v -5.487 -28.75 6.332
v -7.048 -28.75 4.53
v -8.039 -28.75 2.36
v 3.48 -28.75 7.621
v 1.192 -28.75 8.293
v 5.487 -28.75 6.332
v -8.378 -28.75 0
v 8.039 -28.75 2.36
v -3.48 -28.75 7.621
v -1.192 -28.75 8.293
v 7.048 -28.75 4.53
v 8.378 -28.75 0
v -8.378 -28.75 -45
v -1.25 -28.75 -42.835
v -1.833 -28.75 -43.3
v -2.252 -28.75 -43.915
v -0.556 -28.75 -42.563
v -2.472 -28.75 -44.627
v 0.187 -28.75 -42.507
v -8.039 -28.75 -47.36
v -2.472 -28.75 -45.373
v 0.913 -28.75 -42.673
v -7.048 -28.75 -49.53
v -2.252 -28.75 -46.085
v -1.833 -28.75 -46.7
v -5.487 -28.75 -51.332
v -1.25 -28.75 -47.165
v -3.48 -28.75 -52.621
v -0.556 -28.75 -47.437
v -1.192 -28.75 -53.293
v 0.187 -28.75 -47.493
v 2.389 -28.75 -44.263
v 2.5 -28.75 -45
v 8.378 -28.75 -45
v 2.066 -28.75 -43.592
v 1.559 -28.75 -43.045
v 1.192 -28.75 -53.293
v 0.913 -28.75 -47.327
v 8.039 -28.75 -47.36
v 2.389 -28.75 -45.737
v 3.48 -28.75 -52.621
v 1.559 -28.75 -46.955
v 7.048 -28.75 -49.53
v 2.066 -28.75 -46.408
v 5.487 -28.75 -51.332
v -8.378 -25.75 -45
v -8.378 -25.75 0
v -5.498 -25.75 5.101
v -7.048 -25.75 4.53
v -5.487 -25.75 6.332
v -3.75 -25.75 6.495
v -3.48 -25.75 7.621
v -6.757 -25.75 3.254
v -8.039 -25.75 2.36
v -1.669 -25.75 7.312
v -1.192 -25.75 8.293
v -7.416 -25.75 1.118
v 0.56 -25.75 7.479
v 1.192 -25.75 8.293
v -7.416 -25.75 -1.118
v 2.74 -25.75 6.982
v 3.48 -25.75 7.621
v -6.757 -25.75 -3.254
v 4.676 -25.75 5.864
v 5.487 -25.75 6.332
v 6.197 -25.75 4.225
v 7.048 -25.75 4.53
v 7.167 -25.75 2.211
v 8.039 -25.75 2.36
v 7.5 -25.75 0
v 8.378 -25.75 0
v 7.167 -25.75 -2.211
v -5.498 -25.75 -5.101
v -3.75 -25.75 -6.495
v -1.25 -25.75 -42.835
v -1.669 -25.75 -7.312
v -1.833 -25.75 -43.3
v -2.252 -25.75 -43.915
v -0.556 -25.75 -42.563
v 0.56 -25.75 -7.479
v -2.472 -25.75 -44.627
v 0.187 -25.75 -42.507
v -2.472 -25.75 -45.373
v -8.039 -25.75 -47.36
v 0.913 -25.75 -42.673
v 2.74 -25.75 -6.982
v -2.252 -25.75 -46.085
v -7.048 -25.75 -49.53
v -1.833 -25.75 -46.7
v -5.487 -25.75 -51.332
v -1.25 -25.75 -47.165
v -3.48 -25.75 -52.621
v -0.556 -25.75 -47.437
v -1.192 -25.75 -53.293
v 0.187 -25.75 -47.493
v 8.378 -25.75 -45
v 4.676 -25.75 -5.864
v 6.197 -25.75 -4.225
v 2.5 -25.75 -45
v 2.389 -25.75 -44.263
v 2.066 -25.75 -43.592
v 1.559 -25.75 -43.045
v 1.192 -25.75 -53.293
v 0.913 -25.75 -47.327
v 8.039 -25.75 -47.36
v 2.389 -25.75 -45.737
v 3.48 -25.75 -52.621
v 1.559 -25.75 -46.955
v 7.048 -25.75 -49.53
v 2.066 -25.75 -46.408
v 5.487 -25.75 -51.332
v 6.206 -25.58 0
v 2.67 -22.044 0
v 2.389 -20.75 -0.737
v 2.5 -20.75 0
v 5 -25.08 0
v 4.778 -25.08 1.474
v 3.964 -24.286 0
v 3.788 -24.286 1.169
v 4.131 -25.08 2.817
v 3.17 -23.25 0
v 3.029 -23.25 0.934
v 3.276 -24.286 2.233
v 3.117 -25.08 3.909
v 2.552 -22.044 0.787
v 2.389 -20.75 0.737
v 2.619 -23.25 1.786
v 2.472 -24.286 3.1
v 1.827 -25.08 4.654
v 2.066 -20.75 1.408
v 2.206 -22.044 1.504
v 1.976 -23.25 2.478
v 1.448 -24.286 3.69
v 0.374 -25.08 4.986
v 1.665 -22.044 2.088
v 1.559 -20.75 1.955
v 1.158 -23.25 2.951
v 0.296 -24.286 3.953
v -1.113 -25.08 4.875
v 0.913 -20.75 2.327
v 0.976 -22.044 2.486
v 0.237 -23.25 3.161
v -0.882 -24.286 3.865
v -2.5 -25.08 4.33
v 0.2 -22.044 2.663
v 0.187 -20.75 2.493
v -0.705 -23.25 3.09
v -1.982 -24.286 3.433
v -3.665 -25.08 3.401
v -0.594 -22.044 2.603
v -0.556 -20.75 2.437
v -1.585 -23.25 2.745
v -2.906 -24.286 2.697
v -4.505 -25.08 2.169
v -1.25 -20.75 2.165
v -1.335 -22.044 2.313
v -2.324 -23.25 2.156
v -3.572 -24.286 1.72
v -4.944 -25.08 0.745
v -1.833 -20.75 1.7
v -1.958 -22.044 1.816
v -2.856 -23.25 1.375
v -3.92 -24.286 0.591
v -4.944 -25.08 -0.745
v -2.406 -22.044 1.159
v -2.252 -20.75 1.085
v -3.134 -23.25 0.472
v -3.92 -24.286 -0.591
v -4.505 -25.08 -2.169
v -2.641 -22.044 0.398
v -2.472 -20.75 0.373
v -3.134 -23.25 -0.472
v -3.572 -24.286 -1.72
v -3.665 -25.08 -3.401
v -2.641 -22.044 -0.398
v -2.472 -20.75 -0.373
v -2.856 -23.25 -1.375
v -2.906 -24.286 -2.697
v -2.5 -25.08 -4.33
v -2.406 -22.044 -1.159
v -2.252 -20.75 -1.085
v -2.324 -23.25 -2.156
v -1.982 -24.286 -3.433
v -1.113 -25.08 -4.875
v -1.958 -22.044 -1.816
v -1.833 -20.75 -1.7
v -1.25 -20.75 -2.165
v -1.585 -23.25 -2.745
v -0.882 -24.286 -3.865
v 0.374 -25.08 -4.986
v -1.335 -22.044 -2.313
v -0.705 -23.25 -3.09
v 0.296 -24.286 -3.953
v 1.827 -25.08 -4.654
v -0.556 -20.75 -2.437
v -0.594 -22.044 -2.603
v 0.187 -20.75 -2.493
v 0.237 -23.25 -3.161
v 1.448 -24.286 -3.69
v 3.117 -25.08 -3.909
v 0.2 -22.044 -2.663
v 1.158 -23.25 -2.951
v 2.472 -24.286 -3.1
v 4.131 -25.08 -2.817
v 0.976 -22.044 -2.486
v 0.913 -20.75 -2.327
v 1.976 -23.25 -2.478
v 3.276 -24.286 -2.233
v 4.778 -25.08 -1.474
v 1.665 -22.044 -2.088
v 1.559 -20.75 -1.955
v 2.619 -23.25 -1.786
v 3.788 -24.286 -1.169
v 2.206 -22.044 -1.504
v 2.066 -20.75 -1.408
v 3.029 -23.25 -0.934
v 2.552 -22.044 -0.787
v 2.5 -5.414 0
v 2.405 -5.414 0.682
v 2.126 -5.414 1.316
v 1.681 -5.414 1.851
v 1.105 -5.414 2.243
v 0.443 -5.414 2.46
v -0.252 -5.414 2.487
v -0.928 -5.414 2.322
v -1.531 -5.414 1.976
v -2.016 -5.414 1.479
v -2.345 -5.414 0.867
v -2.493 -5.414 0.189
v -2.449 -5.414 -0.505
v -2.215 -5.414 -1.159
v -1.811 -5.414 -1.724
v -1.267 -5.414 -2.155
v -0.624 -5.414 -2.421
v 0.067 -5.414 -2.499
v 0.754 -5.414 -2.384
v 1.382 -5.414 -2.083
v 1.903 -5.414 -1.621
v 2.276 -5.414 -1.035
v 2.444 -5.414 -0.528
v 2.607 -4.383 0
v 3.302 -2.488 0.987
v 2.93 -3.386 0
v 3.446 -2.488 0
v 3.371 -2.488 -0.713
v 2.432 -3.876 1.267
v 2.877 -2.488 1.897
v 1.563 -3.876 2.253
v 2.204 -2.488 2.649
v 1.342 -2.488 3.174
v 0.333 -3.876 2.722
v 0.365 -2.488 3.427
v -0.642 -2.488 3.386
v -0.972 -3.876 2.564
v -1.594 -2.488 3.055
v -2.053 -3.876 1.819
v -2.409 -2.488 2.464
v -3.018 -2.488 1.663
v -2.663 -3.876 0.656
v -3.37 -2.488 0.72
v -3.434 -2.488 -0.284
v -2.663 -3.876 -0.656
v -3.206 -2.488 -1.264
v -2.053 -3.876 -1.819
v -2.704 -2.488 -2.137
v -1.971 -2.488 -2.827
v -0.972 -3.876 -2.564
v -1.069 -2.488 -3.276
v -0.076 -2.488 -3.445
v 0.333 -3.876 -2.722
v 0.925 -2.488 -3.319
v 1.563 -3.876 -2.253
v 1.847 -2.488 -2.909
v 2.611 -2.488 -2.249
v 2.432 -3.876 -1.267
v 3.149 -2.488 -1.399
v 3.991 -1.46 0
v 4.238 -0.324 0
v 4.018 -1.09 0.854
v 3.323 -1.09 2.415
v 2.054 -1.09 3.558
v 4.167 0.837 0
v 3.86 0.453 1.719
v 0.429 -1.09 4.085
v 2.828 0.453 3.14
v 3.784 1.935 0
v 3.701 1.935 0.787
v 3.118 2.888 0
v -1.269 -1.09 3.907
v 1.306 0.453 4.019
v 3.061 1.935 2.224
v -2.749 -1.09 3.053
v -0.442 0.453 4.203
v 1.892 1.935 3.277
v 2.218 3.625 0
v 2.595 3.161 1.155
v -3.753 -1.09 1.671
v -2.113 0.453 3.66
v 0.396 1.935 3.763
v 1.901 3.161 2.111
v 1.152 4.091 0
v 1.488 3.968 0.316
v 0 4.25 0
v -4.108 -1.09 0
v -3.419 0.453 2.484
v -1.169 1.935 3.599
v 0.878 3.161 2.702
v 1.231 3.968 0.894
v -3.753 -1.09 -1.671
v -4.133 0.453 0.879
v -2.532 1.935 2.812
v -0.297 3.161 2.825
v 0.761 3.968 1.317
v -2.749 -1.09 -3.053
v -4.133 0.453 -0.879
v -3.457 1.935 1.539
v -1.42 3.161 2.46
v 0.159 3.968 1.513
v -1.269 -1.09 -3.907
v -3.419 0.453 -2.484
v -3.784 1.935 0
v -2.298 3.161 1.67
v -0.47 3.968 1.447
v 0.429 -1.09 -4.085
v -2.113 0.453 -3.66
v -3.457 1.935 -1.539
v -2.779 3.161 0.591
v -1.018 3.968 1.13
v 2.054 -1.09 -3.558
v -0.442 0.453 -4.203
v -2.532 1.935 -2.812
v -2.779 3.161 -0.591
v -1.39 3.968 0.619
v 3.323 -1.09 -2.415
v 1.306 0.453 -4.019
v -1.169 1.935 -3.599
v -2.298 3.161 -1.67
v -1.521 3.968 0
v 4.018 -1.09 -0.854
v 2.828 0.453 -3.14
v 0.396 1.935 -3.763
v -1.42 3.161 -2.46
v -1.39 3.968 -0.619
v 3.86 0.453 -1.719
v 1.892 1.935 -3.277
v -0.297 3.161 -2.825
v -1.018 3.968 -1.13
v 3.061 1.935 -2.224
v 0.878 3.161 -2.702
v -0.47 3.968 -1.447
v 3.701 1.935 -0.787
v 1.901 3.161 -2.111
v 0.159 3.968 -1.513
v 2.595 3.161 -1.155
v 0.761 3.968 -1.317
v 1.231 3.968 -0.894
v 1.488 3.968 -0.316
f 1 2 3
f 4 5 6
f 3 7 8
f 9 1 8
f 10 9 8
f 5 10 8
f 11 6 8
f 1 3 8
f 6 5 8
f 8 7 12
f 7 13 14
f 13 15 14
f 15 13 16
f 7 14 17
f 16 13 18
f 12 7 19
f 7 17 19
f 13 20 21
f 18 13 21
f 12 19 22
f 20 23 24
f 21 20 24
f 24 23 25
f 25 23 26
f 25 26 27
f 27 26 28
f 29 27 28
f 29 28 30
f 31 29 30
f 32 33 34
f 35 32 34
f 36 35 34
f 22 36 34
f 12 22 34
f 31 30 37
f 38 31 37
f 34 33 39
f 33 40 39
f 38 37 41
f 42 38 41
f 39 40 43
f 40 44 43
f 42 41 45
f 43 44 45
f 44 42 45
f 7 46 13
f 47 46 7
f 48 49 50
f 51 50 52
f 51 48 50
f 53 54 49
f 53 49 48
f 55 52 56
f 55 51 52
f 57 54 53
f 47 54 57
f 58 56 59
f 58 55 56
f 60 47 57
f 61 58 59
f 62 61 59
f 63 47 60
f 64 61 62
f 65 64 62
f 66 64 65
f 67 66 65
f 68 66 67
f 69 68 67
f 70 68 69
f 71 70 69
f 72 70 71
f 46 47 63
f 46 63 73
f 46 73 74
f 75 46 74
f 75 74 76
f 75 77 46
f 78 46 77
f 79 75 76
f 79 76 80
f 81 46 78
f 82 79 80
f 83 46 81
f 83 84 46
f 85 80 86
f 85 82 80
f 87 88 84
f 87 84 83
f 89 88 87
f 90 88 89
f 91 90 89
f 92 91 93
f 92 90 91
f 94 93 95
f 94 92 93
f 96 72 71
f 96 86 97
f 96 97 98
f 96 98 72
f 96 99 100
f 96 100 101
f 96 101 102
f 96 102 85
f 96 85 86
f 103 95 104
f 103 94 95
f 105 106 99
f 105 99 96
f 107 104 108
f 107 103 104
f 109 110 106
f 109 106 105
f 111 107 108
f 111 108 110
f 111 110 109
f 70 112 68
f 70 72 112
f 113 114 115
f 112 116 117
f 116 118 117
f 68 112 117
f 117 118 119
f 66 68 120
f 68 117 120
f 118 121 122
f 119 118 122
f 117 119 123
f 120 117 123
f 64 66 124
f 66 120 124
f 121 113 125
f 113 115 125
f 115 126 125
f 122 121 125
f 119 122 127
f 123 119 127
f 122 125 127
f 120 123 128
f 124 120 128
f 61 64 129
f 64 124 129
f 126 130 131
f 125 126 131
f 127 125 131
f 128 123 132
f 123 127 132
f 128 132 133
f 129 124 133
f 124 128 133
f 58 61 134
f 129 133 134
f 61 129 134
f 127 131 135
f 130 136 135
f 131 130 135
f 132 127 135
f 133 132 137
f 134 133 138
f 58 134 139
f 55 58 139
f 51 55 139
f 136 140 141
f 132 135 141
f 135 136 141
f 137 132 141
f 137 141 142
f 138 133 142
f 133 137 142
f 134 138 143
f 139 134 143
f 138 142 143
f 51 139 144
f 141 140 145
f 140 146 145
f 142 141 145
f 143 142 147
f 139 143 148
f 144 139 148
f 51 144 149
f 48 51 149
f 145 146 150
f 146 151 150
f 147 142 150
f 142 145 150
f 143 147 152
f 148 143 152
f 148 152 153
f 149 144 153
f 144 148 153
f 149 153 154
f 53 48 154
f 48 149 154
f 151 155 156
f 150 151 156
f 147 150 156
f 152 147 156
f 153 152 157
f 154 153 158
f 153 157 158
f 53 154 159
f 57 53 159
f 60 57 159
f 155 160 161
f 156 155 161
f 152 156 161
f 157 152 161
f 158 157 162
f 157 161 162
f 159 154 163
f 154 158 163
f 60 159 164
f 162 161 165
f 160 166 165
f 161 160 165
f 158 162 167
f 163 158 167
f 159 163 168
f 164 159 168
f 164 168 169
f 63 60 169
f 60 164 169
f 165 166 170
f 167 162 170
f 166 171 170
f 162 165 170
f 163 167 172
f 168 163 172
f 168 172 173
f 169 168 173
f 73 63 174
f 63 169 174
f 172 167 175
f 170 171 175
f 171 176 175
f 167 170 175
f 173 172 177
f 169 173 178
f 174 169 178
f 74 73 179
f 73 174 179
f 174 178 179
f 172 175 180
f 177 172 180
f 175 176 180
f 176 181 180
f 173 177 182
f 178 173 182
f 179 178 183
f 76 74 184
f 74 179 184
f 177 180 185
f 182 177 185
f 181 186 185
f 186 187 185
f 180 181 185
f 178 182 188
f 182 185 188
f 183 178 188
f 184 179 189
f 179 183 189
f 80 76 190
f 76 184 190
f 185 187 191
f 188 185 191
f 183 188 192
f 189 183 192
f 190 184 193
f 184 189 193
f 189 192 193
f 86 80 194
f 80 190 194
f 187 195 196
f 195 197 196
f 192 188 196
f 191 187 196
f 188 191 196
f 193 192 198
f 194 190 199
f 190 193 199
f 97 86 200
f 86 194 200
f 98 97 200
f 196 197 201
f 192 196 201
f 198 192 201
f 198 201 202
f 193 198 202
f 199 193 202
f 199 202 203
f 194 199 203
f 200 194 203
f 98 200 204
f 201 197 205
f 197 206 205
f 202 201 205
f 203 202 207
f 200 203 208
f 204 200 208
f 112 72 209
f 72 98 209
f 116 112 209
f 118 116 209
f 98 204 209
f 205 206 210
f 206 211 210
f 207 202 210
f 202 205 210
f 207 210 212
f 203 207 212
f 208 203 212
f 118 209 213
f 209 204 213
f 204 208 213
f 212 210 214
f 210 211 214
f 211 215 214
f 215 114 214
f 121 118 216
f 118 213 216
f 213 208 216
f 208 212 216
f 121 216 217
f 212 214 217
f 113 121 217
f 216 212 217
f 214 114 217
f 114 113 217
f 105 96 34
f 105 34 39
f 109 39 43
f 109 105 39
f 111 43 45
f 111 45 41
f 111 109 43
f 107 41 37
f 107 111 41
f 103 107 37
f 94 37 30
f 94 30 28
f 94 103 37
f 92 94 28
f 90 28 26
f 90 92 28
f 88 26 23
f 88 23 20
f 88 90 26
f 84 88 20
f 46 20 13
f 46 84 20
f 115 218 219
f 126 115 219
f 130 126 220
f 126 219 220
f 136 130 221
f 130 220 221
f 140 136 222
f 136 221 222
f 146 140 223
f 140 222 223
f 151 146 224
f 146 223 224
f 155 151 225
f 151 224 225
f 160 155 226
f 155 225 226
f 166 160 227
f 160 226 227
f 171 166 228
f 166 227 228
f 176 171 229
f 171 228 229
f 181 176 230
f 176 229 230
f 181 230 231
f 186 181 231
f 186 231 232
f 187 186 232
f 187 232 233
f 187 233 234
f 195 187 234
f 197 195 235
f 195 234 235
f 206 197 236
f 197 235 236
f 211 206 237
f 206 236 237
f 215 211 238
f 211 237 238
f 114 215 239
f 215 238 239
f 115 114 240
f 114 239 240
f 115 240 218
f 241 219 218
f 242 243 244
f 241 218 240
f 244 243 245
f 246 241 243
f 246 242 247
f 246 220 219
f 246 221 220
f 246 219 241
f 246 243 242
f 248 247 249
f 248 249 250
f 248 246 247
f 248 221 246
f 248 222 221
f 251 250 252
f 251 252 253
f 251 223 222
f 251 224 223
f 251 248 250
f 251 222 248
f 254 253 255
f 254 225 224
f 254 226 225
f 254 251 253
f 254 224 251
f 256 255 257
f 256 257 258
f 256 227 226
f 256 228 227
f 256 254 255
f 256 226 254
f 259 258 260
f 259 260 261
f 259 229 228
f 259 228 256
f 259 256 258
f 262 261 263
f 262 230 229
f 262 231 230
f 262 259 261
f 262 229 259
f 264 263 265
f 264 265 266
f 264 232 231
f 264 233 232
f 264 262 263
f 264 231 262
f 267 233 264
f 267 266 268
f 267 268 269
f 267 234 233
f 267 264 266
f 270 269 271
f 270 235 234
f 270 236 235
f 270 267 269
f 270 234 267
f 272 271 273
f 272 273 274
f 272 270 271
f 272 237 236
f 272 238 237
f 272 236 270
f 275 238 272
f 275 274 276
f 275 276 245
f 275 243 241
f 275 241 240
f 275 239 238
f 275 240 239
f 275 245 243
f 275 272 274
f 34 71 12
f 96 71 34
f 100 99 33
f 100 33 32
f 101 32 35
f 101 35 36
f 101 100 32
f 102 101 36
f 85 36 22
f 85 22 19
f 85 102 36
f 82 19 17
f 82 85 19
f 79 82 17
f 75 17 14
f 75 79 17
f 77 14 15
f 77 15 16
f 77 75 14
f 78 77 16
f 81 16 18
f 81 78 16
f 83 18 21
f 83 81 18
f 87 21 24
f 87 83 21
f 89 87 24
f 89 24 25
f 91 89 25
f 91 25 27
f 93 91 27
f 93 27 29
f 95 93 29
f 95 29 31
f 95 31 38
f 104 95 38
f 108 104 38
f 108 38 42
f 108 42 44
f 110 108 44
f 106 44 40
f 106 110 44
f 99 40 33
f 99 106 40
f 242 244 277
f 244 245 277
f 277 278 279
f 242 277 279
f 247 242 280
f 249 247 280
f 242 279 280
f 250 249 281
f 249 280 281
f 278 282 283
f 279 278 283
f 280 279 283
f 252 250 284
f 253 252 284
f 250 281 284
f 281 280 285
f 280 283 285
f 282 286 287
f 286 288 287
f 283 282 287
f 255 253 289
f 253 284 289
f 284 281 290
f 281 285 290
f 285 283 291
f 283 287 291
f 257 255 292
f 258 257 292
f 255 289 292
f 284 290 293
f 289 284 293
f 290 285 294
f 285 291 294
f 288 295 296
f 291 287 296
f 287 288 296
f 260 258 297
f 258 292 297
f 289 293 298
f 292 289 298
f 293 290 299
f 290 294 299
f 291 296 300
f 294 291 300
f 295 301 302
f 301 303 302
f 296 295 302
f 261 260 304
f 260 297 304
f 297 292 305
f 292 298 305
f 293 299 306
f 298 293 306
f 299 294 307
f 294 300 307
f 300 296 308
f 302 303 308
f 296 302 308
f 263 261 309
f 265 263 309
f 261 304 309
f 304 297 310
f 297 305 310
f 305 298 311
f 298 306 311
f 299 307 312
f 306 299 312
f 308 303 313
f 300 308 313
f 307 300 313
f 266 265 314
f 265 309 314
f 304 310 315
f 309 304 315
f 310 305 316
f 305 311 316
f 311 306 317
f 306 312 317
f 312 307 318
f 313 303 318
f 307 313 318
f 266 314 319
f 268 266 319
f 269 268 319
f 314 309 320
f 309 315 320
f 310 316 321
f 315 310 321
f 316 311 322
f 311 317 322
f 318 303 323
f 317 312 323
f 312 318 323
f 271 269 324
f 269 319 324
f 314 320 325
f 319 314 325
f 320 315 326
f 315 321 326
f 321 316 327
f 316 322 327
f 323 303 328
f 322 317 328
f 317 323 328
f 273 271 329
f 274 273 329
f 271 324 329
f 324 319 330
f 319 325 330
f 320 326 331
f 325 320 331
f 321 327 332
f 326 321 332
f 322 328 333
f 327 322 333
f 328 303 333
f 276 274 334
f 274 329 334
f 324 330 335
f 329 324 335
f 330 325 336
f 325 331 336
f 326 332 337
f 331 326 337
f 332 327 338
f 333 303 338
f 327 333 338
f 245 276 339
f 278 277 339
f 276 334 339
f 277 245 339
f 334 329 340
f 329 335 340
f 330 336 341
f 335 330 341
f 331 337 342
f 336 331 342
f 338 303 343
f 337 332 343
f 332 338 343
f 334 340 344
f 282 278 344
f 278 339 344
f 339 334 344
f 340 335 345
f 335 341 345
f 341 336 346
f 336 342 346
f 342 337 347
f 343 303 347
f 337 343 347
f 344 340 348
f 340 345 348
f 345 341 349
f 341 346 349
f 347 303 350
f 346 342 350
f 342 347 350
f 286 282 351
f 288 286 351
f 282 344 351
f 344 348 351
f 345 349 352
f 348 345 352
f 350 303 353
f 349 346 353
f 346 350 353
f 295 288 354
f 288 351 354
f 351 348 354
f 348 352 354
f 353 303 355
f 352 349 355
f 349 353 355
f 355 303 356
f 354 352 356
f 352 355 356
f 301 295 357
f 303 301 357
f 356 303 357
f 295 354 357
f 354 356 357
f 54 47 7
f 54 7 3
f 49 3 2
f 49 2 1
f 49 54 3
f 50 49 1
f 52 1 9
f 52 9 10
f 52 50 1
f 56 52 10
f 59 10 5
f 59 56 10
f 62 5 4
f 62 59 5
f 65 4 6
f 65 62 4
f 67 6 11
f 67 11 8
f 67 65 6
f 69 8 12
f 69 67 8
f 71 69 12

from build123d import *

# Parameters (mm, degrees)
SKETCH3_R           = 2.5
BOSS_EXTRUDE1_DEPTH = 3
FILLET1_R           = 5


with BuildPart() as part:
    # Sketch1 → Revolve1 (revolve)
    with BuildSketch(Plane.XY, mode=Mode.PRIVATE) as revolve1_sk:
        with BuildLine():
            Line((0, 4.25), (0, -25.75))
            Line((0, -25.75), (-2.5, -25.75))
            Line((-2.5, -25.75), (-2.5, -3.436931771))
            ThreePointArc((-2.5, -3.436931771), (-4.041624675, 1.314446646), (0, 4.25))
        make_face()
    revolve(revolve1_sk.sketch.rotate(Axis((0, 4.25, 0), (0, -1, 0)), 180), axis=Axis((0, 4.25, 0), (0, -1, 0)))

    # Sketch3 → Boss-Extrude1 (add)
    with BuildSketch(Plane(origin=(0, -25.75, 0), x_dir=(-1, 0, 0), z_dir=(0, -1, 0))):
        with BuildLine():
            Line((8.378284652, 45), (8.378284652, 0))
            ThreePointArc((8.378284652, 0), (0, -8.378284652), (-8.378284652, 0))
            Line((-8.378284652, 0), (-8.378284652, 45))
            ThreePointArc((-8.378284652, 45), (0, 53.378284652), (8.378284652, 45))
        make_face()
        with Locations(Location((0, 45, 0), (0, 0, 180))):
            Circle(SKETCH3_R, mode=Mode.SUBTRACT)
    extrude(amount=BOSS_EXTRUDE1_DEPTH)

    # Fillet1
    fillet1_edges = [part.edges().sort_by_distance(p)[0] for p in [
        (-2.5, -25.75, 0),
        (-2.5, -3.436931771, 0),
    ]]
    fillet(fillet1_edges, radius=FILLET1_R)


solid = part.part
